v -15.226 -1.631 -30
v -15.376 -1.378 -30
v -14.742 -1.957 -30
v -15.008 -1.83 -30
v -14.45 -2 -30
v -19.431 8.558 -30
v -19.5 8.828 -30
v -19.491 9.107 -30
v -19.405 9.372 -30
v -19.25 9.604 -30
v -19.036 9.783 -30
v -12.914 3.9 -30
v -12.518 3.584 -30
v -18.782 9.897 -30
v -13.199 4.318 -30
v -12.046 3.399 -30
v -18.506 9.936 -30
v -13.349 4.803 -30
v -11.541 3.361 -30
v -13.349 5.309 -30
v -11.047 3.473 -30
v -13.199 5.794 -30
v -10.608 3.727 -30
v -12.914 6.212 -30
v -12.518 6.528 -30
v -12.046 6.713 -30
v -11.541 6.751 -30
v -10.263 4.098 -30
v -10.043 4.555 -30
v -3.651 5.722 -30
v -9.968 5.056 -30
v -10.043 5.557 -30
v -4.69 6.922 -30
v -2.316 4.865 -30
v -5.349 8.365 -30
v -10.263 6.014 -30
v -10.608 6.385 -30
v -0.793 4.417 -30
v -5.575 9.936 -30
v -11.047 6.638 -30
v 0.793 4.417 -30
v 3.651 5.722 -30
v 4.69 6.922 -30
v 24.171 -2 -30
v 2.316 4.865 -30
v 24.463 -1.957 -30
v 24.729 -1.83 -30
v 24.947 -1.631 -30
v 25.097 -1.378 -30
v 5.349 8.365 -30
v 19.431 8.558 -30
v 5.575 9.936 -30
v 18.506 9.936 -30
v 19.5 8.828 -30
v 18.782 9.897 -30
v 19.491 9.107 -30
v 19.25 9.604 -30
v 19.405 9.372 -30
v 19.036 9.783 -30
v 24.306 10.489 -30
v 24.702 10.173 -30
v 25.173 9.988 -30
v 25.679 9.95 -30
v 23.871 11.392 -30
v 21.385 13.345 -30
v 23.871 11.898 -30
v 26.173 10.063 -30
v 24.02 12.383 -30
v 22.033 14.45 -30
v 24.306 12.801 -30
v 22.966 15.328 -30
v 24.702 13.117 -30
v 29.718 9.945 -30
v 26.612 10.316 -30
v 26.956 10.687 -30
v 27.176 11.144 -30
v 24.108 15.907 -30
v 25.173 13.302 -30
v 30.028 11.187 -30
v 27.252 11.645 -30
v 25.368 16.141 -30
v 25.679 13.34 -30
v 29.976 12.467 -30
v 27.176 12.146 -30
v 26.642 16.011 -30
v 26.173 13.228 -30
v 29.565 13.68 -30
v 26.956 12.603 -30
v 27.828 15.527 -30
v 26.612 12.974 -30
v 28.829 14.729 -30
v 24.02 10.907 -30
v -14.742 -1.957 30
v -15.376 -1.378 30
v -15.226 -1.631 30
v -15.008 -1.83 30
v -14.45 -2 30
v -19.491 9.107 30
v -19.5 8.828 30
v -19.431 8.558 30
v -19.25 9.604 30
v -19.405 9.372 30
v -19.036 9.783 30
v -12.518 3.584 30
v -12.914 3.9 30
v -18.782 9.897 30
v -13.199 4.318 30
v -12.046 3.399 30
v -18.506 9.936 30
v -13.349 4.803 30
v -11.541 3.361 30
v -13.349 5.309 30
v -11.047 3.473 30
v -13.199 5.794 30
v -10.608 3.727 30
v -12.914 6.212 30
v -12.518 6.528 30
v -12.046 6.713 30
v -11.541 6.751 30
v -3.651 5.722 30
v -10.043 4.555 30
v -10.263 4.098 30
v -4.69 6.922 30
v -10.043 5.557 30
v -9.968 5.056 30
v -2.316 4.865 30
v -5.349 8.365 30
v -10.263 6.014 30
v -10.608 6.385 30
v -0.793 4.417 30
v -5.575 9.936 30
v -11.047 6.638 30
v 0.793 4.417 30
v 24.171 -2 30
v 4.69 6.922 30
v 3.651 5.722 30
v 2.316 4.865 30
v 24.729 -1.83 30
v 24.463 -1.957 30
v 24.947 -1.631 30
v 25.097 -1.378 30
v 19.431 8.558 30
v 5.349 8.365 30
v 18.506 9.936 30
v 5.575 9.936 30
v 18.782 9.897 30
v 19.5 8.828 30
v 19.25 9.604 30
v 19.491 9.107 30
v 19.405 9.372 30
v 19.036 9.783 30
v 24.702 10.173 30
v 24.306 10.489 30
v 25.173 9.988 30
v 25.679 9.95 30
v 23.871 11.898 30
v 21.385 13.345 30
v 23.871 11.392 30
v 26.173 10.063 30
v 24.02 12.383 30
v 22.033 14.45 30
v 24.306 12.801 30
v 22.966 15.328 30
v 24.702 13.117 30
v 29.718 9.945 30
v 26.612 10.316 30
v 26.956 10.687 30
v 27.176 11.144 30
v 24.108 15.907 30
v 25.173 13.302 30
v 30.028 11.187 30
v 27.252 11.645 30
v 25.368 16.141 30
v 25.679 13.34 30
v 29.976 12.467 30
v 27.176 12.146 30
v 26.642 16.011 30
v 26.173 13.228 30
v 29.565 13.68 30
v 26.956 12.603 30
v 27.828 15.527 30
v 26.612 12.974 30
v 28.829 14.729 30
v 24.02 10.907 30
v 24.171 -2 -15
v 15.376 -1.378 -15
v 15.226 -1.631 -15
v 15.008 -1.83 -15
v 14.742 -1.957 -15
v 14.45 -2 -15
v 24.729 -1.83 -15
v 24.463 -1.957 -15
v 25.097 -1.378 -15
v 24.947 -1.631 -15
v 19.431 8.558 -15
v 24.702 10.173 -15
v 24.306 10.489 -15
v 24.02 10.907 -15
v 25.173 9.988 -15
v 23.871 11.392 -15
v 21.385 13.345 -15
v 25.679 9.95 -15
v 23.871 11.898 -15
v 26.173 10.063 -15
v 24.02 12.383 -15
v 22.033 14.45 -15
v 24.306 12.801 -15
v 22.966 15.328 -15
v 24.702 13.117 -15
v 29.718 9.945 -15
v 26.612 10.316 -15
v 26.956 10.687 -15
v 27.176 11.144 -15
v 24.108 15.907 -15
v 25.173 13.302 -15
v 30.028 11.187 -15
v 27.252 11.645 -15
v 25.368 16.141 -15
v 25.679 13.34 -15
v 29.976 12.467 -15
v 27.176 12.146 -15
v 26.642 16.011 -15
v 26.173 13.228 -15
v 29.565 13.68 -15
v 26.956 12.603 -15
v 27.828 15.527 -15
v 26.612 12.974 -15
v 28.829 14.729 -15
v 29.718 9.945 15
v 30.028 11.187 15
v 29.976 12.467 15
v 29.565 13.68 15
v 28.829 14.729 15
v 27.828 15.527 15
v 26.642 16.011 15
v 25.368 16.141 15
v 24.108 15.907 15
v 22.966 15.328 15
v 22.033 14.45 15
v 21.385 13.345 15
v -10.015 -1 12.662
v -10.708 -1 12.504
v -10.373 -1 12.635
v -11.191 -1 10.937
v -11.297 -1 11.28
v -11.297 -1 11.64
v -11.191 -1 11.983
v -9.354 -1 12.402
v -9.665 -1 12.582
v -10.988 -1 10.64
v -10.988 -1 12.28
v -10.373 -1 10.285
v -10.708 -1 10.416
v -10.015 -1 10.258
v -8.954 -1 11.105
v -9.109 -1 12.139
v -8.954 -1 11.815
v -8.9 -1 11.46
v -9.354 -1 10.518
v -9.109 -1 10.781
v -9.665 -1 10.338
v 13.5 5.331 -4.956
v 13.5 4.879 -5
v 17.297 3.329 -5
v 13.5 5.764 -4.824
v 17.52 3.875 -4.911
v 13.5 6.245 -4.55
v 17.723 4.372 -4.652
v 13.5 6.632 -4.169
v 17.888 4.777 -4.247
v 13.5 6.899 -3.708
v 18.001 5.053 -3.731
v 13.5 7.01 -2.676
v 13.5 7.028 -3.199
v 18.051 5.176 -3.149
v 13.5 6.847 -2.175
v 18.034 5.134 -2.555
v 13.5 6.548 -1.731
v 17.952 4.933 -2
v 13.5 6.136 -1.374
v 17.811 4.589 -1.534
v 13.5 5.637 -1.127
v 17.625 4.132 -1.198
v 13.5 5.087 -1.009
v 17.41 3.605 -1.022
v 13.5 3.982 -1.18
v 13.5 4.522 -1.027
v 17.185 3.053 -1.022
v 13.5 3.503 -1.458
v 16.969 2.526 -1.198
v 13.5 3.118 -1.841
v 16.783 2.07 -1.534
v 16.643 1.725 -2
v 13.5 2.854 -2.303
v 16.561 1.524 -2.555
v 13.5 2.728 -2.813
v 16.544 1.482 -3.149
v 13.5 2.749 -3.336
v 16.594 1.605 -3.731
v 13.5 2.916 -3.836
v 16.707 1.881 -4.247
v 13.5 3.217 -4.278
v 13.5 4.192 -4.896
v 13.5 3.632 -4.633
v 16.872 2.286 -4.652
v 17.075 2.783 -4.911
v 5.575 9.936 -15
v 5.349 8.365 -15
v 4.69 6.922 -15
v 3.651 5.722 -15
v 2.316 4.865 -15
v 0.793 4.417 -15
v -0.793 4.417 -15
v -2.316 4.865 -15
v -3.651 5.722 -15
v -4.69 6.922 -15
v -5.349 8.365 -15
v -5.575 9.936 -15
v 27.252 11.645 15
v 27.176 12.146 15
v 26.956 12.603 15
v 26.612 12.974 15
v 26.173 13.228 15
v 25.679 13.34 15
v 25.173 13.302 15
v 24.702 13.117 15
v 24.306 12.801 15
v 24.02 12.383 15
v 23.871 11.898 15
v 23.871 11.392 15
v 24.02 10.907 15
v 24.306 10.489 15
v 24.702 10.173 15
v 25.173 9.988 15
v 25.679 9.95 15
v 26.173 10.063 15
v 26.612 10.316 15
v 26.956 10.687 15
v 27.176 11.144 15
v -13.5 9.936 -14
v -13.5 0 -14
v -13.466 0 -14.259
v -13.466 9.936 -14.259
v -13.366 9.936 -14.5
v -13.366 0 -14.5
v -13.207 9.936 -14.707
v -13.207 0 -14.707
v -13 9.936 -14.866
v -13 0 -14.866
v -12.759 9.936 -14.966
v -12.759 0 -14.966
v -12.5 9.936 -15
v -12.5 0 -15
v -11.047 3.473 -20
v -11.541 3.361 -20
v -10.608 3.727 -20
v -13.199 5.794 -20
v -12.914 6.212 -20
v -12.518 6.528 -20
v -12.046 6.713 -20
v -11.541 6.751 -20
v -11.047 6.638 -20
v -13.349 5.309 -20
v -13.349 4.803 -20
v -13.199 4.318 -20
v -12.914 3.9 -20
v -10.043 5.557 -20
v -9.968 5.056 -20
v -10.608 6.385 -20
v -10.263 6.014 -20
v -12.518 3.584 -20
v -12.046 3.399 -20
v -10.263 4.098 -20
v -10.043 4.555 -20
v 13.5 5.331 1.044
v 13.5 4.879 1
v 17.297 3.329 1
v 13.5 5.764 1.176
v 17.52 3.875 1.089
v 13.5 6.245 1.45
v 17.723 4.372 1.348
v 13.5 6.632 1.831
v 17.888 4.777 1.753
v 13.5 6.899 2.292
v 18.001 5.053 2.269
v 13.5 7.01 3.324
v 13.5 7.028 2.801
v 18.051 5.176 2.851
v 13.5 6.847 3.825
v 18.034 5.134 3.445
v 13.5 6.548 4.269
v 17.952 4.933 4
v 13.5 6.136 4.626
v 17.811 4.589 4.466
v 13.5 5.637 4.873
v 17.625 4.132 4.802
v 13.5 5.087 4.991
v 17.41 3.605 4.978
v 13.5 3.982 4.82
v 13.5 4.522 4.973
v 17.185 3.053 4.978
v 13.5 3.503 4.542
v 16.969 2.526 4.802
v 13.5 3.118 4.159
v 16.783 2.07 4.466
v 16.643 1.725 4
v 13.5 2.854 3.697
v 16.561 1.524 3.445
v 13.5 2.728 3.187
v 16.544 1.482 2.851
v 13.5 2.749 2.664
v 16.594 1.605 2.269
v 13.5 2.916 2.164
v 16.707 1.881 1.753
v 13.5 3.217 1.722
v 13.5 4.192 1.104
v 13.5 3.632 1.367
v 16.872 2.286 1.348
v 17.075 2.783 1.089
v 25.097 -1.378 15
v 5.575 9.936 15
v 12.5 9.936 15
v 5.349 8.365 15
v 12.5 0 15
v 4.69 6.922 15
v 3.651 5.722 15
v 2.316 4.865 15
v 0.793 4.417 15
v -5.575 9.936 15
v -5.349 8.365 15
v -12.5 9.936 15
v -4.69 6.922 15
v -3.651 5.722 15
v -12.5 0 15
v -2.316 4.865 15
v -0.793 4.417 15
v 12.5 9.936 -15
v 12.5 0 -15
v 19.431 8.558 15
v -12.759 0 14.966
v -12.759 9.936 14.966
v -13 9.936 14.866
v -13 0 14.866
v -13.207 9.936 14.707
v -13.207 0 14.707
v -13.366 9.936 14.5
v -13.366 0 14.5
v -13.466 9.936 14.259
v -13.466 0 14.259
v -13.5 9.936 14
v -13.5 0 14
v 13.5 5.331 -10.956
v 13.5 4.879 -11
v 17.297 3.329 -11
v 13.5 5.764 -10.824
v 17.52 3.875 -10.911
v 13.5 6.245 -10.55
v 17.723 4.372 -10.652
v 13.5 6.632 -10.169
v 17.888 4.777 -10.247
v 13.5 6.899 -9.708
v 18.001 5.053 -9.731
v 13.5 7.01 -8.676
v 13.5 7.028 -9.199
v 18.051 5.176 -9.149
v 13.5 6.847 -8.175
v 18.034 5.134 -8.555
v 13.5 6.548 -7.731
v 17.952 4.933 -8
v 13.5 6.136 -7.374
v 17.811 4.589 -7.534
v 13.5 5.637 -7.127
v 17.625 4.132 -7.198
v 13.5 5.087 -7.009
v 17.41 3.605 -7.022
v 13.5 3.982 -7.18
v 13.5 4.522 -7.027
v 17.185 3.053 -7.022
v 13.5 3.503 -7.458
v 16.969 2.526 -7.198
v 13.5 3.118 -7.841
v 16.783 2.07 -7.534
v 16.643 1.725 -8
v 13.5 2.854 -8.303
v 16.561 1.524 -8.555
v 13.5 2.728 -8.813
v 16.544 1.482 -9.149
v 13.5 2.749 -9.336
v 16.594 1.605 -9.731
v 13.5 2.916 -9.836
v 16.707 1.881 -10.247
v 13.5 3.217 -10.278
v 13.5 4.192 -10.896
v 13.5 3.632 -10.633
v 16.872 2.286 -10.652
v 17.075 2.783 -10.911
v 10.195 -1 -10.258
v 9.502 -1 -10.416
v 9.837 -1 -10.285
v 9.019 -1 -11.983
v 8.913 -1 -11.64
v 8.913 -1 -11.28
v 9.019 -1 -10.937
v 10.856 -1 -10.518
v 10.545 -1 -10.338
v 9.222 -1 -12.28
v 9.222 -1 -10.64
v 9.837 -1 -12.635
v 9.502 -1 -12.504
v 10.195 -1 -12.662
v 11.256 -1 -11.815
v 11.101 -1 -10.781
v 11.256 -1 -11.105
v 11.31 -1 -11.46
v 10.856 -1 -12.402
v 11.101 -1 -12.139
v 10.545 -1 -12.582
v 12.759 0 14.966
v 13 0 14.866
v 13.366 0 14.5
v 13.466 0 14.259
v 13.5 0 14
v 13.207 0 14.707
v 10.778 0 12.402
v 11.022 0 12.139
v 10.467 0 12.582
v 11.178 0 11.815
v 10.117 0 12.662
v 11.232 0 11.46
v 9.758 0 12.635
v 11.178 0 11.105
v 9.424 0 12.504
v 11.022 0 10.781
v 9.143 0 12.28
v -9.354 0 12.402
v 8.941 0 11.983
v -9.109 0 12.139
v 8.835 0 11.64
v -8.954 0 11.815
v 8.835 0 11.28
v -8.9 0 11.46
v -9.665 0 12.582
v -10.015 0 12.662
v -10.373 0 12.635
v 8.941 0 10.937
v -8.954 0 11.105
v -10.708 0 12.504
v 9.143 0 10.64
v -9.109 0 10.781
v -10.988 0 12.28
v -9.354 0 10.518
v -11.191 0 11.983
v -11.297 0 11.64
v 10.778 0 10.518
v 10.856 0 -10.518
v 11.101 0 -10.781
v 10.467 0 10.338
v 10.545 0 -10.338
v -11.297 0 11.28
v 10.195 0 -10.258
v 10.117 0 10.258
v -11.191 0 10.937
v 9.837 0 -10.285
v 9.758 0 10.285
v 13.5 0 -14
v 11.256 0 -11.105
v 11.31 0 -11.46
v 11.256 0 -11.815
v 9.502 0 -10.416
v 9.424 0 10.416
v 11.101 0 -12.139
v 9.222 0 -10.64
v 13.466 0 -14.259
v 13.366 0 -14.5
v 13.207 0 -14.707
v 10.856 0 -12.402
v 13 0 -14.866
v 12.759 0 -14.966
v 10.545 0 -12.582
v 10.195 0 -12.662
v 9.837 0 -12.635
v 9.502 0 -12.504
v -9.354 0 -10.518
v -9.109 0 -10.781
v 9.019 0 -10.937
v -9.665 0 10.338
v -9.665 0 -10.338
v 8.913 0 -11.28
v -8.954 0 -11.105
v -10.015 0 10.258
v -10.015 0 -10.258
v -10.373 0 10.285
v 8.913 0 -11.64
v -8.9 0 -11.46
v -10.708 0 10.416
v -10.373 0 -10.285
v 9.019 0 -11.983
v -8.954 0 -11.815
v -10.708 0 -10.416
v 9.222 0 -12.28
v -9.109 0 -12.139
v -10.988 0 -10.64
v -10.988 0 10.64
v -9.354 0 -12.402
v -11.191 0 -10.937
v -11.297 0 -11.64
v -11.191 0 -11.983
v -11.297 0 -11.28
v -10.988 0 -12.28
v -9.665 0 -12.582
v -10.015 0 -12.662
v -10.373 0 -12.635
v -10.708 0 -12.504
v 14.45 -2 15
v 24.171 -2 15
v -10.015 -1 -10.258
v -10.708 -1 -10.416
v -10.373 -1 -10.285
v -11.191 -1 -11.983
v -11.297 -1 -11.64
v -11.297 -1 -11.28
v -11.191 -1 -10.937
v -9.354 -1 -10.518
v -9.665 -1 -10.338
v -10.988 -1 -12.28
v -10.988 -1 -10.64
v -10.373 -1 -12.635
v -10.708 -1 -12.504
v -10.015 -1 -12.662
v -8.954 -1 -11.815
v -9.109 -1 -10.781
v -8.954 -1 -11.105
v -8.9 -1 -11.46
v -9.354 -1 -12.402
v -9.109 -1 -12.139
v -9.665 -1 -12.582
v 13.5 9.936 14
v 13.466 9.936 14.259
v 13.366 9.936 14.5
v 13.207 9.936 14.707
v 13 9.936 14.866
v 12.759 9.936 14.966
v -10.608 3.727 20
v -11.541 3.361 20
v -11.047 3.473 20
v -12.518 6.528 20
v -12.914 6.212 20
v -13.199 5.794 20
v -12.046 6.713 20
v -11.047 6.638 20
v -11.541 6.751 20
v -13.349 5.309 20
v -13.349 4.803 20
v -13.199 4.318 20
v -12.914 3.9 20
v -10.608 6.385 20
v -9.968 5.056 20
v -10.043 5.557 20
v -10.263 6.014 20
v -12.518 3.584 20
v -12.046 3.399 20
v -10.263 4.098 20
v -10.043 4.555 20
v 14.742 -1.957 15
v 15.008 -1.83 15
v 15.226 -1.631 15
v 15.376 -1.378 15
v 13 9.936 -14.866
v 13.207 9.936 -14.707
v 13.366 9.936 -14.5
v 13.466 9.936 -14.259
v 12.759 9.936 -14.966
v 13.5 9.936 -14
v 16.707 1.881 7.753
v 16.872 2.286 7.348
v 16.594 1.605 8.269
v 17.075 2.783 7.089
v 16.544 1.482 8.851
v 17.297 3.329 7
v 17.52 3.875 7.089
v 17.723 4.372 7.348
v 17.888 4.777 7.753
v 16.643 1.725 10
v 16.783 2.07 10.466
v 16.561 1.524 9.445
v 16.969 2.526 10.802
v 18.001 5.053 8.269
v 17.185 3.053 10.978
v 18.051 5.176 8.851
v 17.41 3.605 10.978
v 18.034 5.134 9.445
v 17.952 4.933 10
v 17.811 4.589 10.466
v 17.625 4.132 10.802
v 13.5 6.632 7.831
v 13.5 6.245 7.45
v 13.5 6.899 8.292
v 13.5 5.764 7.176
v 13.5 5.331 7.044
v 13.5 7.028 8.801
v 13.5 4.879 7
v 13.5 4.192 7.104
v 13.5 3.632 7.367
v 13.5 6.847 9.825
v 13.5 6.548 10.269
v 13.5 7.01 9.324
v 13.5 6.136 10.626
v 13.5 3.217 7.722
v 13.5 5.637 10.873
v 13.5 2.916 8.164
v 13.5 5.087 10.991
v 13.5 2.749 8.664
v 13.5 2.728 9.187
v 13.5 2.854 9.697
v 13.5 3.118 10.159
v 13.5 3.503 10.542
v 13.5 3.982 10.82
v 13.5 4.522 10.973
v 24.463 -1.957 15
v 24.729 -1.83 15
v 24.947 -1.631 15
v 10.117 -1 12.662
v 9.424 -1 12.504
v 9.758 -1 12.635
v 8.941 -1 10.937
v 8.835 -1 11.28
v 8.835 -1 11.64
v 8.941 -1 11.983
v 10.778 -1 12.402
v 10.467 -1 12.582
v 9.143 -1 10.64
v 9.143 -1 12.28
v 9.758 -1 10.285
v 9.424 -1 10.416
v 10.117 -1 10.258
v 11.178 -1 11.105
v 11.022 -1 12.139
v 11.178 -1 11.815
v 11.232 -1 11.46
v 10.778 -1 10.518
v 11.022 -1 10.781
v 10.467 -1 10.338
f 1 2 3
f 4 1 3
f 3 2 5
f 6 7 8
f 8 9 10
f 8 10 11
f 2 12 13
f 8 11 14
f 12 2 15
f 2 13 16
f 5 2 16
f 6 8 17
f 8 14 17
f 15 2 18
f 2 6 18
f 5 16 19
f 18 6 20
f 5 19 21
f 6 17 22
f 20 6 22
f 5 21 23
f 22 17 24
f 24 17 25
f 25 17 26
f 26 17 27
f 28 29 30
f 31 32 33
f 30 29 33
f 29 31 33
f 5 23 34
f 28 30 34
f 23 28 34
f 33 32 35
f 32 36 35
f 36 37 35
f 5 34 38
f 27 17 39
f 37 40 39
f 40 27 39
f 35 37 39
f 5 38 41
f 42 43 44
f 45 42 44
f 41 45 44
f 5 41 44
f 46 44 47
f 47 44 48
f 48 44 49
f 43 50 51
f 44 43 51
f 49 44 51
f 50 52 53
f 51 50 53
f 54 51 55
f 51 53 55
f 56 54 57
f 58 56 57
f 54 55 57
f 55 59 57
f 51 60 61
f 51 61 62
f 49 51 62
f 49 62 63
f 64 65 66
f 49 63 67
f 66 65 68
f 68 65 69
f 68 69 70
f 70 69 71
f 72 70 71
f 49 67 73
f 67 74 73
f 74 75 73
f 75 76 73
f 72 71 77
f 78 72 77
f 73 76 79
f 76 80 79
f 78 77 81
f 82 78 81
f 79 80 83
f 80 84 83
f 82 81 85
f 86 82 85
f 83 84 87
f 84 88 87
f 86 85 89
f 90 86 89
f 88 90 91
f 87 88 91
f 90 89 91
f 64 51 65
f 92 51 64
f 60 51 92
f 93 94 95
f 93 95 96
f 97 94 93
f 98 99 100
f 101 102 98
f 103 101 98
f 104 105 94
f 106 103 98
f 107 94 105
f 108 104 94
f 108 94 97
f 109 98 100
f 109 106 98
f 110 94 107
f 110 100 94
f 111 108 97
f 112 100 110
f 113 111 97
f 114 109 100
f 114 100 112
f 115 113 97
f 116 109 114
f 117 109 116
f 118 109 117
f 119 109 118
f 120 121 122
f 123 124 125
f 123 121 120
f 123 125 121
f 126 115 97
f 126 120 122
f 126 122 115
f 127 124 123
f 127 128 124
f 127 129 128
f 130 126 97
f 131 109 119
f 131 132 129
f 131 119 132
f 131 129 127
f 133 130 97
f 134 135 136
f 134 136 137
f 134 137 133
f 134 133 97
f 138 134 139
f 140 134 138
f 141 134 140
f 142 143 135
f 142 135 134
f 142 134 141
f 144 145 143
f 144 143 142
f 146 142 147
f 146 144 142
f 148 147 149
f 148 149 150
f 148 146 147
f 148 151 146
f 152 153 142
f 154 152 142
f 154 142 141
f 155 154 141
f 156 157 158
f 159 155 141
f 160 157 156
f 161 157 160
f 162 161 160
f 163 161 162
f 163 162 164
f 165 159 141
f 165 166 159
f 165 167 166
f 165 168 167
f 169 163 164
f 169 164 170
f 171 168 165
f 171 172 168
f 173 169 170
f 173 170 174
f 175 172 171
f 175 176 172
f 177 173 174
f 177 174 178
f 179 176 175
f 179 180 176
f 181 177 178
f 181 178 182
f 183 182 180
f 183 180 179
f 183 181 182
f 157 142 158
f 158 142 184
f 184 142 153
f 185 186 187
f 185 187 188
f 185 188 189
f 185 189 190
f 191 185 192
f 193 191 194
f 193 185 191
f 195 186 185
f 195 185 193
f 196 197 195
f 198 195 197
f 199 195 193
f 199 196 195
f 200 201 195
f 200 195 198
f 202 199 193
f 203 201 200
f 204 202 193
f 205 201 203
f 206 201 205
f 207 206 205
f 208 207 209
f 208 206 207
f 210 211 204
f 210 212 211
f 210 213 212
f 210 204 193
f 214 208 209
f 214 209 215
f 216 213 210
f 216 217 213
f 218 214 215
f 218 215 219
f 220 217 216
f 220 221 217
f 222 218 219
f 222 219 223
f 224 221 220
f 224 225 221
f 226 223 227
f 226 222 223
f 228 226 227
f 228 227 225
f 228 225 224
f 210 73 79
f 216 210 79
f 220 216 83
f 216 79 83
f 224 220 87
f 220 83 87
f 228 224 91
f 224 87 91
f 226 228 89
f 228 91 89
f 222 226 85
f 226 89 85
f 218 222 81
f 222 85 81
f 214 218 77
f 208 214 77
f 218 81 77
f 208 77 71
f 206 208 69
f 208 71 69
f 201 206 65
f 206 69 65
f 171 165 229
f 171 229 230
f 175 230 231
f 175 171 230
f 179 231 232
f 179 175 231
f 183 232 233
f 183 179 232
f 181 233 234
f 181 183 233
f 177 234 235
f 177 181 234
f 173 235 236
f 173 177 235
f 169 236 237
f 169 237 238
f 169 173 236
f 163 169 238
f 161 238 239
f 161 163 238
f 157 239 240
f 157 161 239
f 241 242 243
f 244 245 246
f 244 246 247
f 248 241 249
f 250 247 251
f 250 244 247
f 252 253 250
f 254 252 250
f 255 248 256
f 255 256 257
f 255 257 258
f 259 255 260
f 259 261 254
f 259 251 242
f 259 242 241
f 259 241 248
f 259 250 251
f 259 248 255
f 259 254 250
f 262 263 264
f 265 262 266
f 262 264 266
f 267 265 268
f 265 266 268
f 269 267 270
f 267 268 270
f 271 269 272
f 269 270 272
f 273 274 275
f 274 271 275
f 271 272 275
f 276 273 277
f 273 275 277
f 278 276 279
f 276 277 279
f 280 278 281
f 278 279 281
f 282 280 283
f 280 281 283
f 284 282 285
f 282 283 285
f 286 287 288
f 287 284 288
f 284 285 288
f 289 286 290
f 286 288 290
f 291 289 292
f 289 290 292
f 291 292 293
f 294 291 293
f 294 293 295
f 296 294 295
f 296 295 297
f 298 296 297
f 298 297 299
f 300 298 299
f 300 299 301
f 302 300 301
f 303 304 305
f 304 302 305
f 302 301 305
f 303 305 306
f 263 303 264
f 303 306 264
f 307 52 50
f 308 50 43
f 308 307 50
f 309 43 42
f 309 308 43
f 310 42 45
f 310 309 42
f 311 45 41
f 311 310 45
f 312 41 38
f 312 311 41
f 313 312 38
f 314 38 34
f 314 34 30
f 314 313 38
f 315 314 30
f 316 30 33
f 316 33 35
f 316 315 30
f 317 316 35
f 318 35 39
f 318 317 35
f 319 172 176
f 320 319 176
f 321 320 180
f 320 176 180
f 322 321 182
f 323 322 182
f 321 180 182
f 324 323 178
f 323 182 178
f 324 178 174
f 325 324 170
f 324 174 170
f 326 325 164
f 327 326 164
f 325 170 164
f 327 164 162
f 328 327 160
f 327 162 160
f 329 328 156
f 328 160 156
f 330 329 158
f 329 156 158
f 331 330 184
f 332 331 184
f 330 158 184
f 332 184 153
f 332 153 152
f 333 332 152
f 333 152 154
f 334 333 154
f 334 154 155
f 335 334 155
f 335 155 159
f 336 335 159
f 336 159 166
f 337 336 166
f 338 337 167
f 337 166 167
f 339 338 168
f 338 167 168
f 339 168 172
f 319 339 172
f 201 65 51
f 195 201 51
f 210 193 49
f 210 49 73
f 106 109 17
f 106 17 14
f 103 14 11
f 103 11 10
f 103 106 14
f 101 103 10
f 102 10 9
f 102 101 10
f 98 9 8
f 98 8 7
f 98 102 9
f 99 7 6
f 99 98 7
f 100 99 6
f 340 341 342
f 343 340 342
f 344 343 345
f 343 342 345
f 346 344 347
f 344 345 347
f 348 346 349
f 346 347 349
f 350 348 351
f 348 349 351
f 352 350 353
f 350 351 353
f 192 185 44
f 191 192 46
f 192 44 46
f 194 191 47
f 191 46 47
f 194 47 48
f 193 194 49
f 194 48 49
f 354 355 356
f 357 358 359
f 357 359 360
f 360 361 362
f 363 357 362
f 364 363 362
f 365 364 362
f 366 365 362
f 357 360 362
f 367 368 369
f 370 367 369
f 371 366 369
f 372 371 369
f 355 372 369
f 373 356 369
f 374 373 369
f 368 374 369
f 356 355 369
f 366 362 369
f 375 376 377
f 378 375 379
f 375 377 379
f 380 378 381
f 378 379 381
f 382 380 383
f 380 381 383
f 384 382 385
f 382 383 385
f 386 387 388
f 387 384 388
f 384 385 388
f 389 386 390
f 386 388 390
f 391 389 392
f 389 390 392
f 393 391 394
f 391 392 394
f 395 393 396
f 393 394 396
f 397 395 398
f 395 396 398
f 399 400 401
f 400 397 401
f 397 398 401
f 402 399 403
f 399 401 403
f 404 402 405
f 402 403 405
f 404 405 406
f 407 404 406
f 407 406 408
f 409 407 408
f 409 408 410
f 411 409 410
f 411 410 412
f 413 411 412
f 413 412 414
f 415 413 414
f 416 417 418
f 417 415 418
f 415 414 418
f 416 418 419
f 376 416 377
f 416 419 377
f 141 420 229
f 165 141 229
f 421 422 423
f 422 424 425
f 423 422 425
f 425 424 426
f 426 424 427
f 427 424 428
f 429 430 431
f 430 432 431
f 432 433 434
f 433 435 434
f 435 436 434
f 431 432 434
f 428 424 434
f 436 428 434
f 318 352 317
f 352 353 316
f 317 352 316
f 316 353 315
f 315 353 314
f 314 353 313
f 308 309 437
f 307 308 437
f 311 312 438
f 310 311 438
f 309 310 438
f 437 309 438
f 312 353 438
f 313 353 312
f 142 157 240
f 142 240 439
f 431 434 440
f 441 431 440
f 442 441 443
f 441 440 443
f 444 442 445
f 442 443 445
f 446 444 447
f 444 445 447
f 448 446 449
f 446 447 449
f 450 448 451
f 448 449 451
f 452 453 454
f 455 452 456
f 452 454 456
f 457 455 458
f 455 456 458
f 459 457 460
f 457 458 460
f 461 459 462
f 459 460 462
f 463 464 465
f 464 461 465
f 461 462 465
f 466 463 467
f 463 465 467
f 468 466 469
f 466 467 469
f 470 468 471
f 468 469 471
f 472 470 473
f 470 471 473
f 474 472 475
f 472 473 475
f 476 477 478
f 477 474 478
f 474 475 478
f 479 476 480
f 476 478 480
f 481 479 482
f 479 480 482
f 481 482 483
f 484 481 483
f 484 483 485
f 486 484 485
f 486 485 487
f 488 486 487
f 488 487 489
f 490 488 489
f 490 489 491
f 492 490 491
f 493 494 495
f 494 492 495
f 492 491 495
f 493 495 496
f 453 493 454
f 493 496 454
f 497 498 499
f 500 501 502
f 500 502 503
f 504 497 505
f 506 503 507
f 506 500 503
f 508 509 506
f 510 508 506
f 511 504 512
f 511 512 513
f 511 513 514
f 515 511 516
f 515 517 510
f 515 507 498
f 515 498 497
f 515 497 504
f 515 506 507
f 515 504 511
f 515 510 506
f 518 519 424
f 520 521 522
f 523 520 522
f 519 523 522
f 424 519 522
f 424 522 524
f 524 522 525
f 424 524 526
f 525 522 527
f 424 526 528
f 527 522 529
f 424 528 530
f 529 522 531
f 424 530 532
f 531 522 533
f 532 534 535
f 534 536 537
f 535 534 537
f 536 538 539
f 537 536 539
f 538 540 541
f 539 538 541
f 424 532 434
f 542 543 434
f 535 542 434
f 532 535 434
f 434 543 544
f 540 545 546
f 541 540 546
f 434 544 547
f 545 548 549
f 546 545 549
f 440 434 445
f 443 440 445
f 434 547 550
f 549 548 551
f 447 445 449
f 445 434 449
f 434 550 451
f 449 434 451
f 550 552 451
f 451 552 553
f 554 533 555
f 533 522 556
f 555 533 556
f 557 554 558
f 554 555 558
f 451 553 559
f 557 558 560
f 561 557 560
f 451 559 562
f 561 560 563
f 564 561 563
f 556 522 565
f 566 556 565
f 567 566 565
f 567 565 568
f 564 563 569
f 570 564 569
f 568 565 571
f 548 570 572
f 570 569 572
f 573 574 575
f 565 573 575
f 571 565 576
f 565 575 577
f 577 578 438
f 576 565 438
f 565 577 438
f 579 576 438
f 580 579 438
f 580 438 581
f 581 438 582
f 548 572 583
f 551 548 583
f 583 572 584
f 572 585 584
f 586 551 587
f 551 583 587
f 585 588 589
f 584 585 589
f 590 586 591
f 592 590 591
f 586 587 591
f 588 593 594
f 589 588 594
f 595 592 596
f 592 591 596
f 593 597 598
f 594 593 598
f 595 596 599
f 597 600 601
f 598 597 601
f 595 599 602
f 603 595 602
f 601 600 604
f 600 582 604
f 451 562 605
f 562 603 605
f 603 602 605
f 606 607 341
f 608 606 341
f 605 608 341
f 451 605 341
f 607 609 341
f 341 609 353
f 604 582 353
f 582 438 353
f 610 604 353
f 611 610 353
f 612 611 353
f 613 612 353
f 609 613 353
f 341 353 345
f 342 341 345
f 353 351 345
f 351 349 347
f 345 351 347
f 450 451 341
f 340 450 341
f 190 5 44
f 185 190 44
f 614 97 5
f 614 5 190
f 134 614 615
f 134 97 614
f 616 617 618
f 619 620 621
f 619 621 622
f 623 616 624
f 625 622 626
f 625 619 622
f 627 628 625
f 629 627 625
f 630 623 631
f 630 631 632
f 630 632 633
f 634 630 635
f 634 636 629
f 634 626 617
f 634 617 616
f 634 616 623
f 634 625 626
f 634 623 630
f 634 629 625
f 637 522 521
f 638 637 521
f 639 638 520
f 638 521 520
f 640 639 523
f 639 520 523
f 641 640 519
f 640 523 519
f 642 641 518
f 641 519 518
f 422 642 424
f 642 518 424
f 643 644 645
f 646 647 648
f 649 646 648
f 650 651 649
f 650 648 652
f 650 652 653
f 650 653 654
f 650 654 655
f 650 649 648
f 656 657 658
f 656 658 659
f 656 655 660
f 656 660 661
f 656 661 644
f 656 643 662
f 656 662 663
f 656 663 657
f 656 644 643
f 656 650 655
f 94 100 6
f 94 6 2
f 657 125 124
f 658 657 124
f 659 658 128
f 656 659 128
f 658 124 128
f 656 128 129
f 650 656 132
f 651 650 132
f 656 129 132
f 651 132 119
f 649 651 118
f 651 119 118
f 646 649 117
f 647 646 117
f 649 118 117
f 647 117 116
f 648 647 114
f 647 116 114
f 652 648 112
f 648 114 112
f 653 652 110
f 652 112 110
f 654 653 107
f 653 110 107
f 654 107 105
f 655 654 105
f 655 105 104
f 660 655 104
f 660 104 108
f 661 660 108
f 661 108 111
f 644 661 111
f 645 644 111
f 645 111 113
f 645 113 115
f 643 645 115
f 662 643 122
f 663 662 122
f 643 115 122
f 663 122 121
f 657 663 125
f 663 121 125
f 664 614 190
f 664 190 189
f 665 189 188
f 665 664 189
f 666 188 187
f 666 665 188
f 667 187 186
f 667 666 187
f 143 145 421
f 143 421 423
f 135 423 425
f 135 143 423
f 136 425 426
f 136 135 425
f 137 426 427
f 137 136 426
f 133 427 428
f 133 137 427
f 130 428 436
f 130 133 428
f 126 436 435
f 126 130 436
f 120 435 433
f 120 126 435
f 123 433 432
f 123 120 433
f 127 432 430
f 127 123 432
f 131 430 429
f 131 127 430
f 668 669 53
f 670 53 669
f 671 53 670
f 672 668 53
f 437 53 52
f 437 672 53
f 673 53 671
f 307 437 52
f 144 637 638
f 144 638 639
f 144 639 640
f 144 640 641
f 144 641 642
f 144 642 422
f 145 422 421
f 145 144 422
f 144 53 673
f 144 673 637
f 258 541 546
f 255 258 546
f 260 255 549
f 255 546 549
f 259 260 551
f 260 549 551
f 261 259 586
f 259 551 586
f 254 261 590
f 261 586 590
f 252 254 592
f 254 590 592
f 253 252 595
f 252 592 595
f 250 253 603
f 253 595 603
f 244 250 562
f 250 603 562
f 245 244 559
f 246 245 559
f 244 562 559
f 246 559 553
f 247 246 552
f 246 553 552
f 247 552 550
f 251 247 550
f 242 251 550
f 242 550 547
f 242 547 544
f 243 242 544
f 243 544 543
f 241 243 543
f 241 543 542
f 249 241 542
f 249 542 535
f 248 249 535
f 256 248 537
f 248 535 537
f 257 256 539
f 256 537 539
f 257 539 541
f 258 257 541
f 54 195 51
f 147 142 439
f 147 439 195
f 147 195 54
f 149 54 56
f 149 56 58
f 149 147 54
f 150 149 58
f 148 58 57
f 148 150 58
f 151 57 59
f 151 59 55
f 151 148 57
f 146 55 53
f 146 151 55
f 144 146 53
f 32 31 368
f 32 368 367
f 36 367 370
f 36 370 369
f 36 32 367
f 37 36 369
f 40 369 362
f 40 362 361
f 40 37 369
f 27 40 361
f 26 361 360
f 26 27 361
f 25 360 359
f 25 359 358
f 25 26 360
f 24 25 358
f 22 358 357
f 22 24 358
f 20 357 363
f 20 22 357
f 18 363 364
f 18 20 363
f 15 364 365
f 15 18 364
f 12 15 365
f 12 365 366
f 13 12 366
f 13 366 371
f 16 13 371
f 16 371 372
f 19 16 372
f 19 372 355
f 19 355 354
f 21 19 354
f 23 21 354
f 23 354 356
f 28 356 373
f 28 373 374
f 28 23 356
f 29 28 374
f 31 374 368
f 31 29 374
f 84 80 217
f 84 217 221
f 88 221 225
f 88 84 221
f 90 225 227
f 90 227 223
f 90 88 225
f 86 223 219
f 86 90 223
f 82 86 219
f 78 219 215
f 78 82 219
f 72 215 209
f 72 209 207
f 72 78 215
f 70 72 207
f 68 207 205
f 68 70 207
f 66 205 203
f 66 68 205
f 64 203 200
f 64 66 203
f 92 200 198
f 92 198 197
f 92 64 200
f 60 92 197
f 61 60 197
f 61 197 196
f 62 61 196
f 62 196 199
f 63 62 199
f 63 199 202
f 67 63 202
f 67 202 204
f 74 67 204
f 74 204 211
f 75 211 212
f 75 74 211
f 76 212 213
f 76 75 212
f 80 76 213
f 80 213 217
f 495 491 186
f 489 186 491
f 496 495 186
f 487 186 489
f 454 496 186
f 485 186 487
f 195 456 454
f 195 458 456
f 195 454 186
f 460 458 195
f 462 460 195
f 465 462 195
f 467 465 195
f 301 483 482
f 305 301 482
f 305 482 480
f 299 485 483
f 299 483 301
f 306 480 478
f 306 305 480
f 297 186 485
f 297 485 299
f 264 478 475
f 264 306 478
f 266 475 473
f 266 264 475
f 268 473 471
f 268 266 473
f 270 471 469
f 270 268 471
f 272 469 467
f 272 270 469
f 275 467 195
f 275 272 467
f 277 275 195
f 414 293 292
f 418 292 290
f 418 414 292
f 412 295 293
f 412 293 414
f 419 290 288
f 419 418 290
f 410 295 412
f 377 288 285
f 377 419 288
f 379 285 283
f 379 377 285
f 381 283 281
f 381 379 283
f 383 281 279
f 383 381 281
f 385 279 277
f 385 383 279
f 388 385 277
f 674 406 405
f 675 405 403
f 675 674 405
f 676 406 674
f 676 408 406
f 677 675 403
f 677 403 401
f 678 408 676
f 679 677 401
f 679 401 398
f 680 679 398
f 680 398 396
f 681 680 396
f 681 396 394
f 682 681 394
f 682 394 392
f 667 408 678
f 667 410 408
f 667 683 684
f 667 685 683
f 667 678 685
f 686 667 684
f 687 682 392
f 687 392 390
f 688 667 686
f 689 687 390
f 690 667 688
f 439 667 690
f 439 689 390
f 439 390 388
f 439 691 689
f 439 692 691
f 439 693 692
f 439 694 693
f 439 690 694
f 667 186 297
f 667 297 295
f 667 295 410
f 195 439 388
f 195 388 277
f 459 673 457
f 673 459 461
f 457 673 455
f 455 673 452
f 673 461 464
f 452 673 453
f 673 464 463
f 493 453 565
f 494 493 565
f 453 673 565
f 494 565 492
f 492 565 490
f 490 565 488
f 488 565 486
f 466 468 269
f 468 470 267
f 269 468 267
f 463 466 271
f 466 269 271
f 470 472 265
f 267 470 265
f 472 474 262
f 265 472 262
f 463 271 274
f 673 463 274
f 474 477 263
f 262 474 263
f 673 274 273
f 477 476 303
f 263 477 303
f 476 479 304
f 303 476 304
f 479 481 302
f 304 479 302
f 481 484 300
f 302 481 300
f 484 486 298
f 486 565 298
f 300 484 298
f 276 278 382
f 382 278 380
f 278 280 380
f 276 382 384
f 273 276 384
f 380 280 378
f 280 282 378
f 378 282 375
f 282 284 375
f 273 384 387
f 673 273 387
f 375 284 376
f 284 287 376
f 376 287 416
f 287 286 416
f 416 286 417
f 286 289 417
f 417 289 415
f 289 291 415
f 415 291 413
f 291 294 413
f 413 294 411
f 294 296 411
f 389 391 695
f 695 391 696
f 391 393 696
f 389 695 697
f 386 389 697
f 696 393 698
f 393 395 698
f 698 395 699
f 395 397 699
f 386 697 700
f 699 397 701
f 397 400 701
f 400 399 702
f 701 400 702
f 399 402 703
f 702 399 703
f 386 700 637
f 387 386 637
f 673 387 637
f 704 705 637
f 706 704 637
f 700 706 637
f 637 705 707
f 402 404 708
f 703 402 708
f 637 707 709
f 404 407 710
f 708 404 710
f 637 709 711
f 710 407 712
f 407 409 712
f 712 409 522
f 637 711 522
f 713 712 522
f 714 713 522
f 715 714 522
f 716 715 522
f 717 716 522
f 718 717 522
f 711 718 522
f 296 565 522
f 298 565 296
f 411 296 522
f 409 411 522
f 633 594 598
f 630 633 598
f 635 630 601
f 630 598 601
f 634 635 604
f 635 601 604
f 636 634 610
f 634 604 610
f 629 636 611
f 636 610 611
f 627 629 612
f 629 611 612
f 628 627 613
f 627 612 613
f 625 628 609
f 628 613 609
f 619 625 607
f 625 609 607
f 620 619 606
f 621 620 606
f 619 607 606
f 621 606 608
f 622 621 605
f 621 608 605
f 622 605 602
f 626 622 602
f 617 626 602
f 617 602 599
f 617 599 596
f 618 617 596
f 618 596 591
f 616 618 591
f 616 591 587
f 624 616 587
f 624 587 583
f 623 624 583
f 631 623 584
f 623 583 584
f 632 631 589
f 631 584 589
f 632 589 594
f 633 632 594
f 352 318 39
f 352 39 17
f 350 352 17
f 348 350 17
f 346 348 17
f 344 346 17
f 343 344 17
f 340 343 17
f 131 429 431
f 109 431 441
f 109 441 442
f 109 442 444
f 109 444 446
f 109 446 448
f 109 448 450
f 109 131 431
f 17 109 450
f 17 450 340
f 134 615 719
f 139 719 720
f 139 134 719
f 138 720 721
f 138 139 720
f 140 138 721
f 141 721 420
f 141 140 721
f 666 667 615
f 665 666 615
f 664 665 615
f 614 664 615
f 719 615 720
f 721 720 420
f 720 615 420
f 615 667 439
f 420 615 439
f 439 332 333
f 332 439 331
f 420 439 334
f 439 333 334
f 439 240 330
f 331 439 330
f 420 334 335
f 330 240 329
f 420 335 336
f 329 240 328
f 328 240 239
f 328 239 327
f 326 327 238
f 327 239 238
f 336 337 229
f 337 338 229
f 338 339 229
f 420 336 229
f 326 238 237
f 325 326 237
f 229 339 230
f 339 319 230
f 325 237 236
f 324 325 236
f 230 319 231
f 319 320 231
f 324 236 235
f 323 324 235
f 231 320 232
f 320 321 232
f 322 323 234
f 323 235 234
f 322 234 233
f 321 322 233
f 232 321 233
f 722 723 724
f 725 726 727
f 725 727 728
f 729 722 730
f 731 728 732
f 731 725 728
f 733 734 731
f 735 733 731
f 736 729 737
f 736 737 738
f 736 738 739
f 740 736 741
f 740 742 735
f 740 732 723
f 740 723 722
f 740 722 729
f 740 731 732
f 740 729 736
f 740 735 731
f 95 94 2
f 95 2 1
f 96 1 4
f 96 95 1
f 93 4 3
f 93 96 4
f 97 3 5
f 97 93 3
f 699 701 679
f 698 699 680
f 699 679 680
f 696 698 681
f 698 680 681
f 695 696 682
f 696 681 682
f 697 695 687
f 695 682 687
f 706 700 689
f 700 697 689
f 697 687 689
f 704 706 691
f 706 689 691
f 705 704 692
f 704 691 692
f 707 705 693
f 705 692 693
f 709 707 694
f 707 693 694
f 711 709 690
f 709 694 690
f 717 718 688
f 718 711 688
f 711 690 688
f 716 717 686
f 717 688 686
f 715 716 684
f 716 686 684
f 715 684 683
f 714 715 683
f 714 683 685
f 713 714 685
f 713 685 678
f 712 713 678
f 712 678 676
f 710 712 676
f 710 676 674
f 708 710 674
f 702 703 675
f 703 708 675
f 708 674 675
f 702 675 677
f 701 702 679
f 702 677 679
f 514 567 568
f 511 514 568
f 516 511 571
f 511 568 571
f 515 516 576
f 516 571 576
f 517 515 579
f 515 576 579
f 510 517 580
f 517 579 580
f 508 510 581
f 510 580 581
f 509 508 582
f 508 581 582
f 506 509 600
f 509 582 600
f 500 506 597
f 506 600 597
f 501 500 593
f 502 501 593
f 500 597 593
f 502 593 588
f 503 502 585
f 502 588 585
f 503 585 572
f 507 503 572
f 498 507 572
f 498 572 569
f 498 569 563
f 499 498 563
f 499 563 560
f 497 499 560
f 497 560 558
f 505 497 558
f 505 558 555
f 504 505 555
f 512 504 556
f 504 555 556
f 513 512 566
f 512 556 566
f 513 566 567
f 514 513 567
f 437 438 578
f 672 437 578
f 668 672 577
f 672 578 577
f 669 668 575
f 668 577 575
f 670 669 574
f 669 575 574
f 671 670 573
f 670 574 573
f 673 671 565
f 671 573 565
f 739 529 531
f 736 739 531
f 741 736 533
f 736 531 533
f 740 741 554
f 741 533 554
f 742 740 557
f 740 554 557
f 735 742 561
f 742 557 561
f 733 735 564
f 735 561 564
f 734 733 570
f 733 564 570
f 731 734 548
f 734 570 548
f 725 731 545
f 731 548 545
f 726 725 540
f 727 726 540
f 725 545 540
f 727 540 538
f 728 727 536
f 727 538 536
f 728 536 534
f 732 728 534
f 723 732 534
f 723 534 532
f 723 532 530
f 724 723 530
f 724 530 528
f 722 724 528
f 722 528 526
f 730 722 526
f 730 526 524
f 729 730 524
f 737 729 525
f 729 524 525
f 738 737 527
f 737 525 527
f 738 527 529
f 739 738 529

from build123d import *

# Parameters (mm, degrees)
BOSS_EXTRUDE3_DEPTH      = 30
BOSS_EXTRUDE3_DEPTH_BACK = 30
CUT_EXTRUDE1_DEPTH       = 9.93575
SKETCH1_R                = 1.205
CUT_EXTRUDE2_DEPTH       = 1
CUT_EXTRUDE3_REACH       = 38.571
SKETCH9_R                = 2
BOSS_EXTRUDE5_START      = -30
SKETCH20_R               = 1.7
BOSS_EXTRUDE5_DEPTH      = 15
BOSS_EXTRUDE6_START      = 30
SKETCH20_2_R             = 1.7
BOSS_EXTRUDE6_DEPTH      = 15
CUT_EXTRUDE6_START       = -30
SKETCH22_R               = 1.7
CUT_EXTRUDE6_DEPTH       = 10
CUT_EXTRUDE6_DEPTH_BACK  = 1
CUT_EXTRUDE7_START       = 30
SKETCH22_2_R             = 1.7
CUT_EXTRUDE7_DEPTH       = 10
CUT_EXTRUDE7_DEPTH_BACK  = 10


with BuildPart() as part:
    # Sketch5 → Boss-Extrude3 (new body, two sides)
    with BuildSketch(Plane.XY) as boss_extrude3_sk:
        with BuildLine():
            Line((-5.575, 9.935749893), (-18.505577921, 9.935749893))
            ThreePointArc((-18.505577921, 9.935749893), (-19.335599809, 9.493480712), (-19.431435495, 8.557877225))
            Line((-19.431435495, 8.557877225), (-15.376331952, -1.377872669))
            ThreePointArc((-15.376331952, -1.377872669), (-15.008205197, -1.830021888), (-14.450474378, -2))
            Line((-14.450474378, -2), (14.450474378, -2))
            ThreePointArc((14.450474378, -2), (15.008205197, -1.830021888), (15.376331952, -1.377872669))
            Line((15.376331952, -1.377872669), (19.431435495, 8.557877225))
            ThreePointArc((19.431435495, 8.557877225), (19.335599809, 9.493480712), (18.505577921, 9.935749893))
            Line((18.505577921, 9.935749893), (5.575, 9.935749893))
            ThreePointArc((5.575, 9.935749893), (0, 4.360749893), (-5.575, 9.935749893))
        make_face()
    extrude(amount=BOSS_EXTRUDE3_DEPTH)
    extrude(boss_extrude3_sk.sketch, amount=-BOSS_EXTRUDE3_DEPTH_BACK)

    # Sketch8 → Cut-Extrude1 (cut)
    with BuildSketch(Plane(origin=(0, 0, 0), x_dir=(1, 0, 0), z_dir=(0, 1, 0))):
        with BuildLine():
            Line((-12.5, 15), (12.5, 15))
            ThreePointArc((12.5, 15), (13.207106781, 14.707106781), (13.5, 14))
            Line((13.5, 14), (13.5, -14))
            ThreePointArc((13.5, -14), (13.207106781, -14.707106781), (12.5, -15))
            Line((12.5, -15), (-12.5, -15))
            ThreePointArc((-12.5, -15), (-13.207106781, -14.707106781), (-13.5, -14))
            Line((-13.5, -14), (-13.5, 14))
            ThreePointArc((-13.5, 14), (-13.207106781, 14.707106781), (-12.5, 15))
        make_face()
    extrude(amount=CUT_EXTRUDE1_DEPTH, mode=Mode.SUBTRACT)

    # Sketch1 → Cut-Extrude2 (cut)
    with BuildSketch(Plane(origin=(0, 0, 0), x_dir=(1, 0, 0), z_dir=(0, 1, 0))):
        with Locations((-10.105, 11.46)):
            Circle(SKETCH1_R)
        with Locations((-10.105, -11.46)):
            Circle(SKETCH1_R)
        with Locations((10.026555832, -11.46)):
            Circle(SKETCH1_R)
        with Locations((10.105, 11.46)):
            Circle(SKETCH1_R)
    extrude(amount=-CUT_EXTRUDE2_DEPTH, mode=Mode.SUBTRACT)

    # Cut-Extrude3: up to this face of the body (flat: up to its plane)
    cut_extrude3_end = Plane(part.part.faces().sort_by_distance((13.5, 4.967875, 0))[0])
    # Sketch9 → Cut-Extrude3 (cut, up to the picked face)
    with BuildSketch(Plane(origin=(13.662837448, -5.576249517, 0), x_dir=(0, 0, -1), z_dir=(0.925857573, -0.377872669, 0)), mode=Mode.PRIVATE) as cut_extrude3_sk1:
        with Locations((-9, 9.618413932)):
            Circle(SKETCH9_R)
    cut_extrude3_tool1 = split(extrude(cut_extrude3_sk1.sketch, amount=-CUT_EXTRUDE3_REACH, mode=Mode.PRIVATE), bisect_by=cut_extrude3_end, keep=Keep.BOTH, mode=Mode.PRIVATE)
    add(cut_extrude3_tool1.solids().sort_by_distance((17.297373, 3.329032, 9))[0], mode=Mode.SUBTRACT)
    # Sketch9 → Cut-Extrude3 (cut, up to the picked face)
    with BuildSketch(Plane(origin=(13.662837448, -5.576249517, 0), x_dir=(0, 0, -1), z_dir=(0.925857573, -0.377872669, 0)), mode=Mode.PRIVATE) as cut_extrude3_sk2:
        with Locations((-3, 9.618413932)):
            Circle(SKETCH9_R)
    cut_extrude3_tool2 = split(extrude(cut_extrude3_sk2.sketch, amount=-CUT_EXTRUDE3_REACH, mode=Mode.PRIVATE), bisect_by=cut_extrude3_end, keep=Keep.BOTH, mode=Mode.PRIVATE)
    add(cut_extrude3_tool2.solids().sort_by_distance((17.297373, 3.329032, 3))[0], mode=Mode.SUBTRACT)
    # Sketch9 → Cut-Extrude3 (cut, up to the picked face)
    with BuildSketch(Plane(origin=(13.662837448, -5.576249517, 0), x_dir=(0, 0, -1), z_dir=(0.925857573, -0.377872669, 0)), mode=Mode.PRIVATE) as cut_extrude3_sk3:
        with Locations((3, 9.618413932)):
            Circle(SKETCH9_R)
    cut_extrude3_tool3 = split(extrude(cut_extrude3_sk3.sketch, amount=-CUT_EXTRUDE3_REACH, mode=Mode.PRIVATE), bisect_by=cut_extrude3_end, keep=Keep.BOTH, mode=Mode.PRIVATE)
    add(cut_extrude3_tool3.solids().sort_by_distance((17.297373, 3.329032, -3))[0], mode=Mode.SUBTRACT)
    # Sketch9 → Cut-Extrude3 (cut, up to the picked face)
    with BuildSketch(Plane(origin=(13.662837448, -5.576249517, 0), x_dir=(0, 0, -1), z_dir=(0.925857573, -0.377872669, 0)), mode=Mode.PRIVATE) as cut_extrude3_sk4:
        with Locations((9, 9.618413932)):
            Circle(SKETCH9_R)
    cut_extrude3_tool4 = split(extrude(cut_extrude3_sk4.sketch, amount=-CUT_EXTRUDE3_REACH, mode=Mode.PRIVATE), bisect_by=cut_extrude3_end, keep=Keep.BOTH, mode=Mode.PRIVATE)
    add(cut_extrude3_tool4.solids().sort_by_distance((17.297373, 3.329032, -9))[0], mode=Mode.SUBTRACT)

    # Sketch20 → Boss-Extrude5 (add)
    with BuildSketch(Plane.XY.offset(BOSS_EXTRUDE5_START)):
        with BuildLine():
            Line((19.431435495, 8.557877225), (15.376331952, -1.377872669))
            ThreePointArc((15.376331952, -1.377872669), (15.008205197, -1.830021888), (14.450474378, -2))
            Line((14.450474378, -2), (24.171191968, -2))
            ThreePointArc((24.171191968, -2), (24.728922787, -1.830021888), (25.097049542, -1.377872669))
            Line((25.097049542, -1.377872669), (29.71812802, 9.944619967))
            ThreePointArc((29.71812802, 9.944619967), (27.252195948, 15.811406056), (21.385409859, 13.345473984))
            Line((21.385409859, 13.345473984), (19.431435495, 8.557877225))
        make_face()
        with Locations((25.55176894, 11.645046975)):
            Circle(SKETCH20_R, mode=Mode.SUBTRACT)
    extrude(amount=BOSS_EXTRUDE5_DEPTH)

    # Sketch20<2> → Boss-Extrude6 (add)
    with BuildSketch(Plane.XY.offset(BOSS_EXTRUDE6_START)):
        with BuildLine():
            Line((19.431435495, 8.557877225), (15.376331952, -1.377872669))
            ThreePointArc((15.376331952, -1.377872669), (15.008205197, -1.830021888), (14.450474378, -2))
            Line((14.450474378, -2), (24.171191968, -2))
            ThreePointArc((24.171191968, -2), (24.728922787, -1.830021888), (25.097049542, -1.377872669))
            Line((25.097049542, -1.377872669), (29.71812802, 9.944619967))
            ThreePointArc((29.71812802, 9.944619967), (27.252195948, 15.811406056), (21.385409859, 13.345473984))
            Line((21.385409859, 13.345473984), (19.431435495, 8.557877225))
        make_face()
        with Locations((25.55176894, 11.645046975)):
            Circle(SKETCH20_2_R, mode=Mode.SUBTRACT)
    extrude(amount=-BOSS_EXTRUDE6_DEPTH)

    # Sketch22 → Cut-Extrude6 (cut, two sides)
    with BuildSketch(Plane.XY.offset(CUT_EXTRUDE6_START)) as cut_extrude6_sk:
        with Locations((-11.667770039, 5.055979667)):
            Circle(SKETCH22_R)
    extrude(amount=CUT_EXTRUDE6_DEPTH, mode=Mode.SUBTRACT)
    extrude(cut_extrude6_sk.sketch, amount=-CUT_EXTRUDE6_DEPTH_BACK, mode=Mode.SUBTRACT)

    # Sketch22<2> → Cut-Extrude7 (cut, two sides)
    with BuildSketch(Plane.XY.offset(CUT_EXTRUDE7_START)) as cut_extrude7_sk:
        with Locations((-11.667770039, 5.055979667)):
            Circle(SKETCH22_2_R)
    extrude(amount=CUT_EXTRUDE7_DEPTH, mode=Mode.SUBTRACT)
    extrude(cut_extrude7_sk.sketch, amount=-CUT_EXTRUDE7_DEPTH_BACK, mode=Mode.SUBTRACT)


solid = part.part
